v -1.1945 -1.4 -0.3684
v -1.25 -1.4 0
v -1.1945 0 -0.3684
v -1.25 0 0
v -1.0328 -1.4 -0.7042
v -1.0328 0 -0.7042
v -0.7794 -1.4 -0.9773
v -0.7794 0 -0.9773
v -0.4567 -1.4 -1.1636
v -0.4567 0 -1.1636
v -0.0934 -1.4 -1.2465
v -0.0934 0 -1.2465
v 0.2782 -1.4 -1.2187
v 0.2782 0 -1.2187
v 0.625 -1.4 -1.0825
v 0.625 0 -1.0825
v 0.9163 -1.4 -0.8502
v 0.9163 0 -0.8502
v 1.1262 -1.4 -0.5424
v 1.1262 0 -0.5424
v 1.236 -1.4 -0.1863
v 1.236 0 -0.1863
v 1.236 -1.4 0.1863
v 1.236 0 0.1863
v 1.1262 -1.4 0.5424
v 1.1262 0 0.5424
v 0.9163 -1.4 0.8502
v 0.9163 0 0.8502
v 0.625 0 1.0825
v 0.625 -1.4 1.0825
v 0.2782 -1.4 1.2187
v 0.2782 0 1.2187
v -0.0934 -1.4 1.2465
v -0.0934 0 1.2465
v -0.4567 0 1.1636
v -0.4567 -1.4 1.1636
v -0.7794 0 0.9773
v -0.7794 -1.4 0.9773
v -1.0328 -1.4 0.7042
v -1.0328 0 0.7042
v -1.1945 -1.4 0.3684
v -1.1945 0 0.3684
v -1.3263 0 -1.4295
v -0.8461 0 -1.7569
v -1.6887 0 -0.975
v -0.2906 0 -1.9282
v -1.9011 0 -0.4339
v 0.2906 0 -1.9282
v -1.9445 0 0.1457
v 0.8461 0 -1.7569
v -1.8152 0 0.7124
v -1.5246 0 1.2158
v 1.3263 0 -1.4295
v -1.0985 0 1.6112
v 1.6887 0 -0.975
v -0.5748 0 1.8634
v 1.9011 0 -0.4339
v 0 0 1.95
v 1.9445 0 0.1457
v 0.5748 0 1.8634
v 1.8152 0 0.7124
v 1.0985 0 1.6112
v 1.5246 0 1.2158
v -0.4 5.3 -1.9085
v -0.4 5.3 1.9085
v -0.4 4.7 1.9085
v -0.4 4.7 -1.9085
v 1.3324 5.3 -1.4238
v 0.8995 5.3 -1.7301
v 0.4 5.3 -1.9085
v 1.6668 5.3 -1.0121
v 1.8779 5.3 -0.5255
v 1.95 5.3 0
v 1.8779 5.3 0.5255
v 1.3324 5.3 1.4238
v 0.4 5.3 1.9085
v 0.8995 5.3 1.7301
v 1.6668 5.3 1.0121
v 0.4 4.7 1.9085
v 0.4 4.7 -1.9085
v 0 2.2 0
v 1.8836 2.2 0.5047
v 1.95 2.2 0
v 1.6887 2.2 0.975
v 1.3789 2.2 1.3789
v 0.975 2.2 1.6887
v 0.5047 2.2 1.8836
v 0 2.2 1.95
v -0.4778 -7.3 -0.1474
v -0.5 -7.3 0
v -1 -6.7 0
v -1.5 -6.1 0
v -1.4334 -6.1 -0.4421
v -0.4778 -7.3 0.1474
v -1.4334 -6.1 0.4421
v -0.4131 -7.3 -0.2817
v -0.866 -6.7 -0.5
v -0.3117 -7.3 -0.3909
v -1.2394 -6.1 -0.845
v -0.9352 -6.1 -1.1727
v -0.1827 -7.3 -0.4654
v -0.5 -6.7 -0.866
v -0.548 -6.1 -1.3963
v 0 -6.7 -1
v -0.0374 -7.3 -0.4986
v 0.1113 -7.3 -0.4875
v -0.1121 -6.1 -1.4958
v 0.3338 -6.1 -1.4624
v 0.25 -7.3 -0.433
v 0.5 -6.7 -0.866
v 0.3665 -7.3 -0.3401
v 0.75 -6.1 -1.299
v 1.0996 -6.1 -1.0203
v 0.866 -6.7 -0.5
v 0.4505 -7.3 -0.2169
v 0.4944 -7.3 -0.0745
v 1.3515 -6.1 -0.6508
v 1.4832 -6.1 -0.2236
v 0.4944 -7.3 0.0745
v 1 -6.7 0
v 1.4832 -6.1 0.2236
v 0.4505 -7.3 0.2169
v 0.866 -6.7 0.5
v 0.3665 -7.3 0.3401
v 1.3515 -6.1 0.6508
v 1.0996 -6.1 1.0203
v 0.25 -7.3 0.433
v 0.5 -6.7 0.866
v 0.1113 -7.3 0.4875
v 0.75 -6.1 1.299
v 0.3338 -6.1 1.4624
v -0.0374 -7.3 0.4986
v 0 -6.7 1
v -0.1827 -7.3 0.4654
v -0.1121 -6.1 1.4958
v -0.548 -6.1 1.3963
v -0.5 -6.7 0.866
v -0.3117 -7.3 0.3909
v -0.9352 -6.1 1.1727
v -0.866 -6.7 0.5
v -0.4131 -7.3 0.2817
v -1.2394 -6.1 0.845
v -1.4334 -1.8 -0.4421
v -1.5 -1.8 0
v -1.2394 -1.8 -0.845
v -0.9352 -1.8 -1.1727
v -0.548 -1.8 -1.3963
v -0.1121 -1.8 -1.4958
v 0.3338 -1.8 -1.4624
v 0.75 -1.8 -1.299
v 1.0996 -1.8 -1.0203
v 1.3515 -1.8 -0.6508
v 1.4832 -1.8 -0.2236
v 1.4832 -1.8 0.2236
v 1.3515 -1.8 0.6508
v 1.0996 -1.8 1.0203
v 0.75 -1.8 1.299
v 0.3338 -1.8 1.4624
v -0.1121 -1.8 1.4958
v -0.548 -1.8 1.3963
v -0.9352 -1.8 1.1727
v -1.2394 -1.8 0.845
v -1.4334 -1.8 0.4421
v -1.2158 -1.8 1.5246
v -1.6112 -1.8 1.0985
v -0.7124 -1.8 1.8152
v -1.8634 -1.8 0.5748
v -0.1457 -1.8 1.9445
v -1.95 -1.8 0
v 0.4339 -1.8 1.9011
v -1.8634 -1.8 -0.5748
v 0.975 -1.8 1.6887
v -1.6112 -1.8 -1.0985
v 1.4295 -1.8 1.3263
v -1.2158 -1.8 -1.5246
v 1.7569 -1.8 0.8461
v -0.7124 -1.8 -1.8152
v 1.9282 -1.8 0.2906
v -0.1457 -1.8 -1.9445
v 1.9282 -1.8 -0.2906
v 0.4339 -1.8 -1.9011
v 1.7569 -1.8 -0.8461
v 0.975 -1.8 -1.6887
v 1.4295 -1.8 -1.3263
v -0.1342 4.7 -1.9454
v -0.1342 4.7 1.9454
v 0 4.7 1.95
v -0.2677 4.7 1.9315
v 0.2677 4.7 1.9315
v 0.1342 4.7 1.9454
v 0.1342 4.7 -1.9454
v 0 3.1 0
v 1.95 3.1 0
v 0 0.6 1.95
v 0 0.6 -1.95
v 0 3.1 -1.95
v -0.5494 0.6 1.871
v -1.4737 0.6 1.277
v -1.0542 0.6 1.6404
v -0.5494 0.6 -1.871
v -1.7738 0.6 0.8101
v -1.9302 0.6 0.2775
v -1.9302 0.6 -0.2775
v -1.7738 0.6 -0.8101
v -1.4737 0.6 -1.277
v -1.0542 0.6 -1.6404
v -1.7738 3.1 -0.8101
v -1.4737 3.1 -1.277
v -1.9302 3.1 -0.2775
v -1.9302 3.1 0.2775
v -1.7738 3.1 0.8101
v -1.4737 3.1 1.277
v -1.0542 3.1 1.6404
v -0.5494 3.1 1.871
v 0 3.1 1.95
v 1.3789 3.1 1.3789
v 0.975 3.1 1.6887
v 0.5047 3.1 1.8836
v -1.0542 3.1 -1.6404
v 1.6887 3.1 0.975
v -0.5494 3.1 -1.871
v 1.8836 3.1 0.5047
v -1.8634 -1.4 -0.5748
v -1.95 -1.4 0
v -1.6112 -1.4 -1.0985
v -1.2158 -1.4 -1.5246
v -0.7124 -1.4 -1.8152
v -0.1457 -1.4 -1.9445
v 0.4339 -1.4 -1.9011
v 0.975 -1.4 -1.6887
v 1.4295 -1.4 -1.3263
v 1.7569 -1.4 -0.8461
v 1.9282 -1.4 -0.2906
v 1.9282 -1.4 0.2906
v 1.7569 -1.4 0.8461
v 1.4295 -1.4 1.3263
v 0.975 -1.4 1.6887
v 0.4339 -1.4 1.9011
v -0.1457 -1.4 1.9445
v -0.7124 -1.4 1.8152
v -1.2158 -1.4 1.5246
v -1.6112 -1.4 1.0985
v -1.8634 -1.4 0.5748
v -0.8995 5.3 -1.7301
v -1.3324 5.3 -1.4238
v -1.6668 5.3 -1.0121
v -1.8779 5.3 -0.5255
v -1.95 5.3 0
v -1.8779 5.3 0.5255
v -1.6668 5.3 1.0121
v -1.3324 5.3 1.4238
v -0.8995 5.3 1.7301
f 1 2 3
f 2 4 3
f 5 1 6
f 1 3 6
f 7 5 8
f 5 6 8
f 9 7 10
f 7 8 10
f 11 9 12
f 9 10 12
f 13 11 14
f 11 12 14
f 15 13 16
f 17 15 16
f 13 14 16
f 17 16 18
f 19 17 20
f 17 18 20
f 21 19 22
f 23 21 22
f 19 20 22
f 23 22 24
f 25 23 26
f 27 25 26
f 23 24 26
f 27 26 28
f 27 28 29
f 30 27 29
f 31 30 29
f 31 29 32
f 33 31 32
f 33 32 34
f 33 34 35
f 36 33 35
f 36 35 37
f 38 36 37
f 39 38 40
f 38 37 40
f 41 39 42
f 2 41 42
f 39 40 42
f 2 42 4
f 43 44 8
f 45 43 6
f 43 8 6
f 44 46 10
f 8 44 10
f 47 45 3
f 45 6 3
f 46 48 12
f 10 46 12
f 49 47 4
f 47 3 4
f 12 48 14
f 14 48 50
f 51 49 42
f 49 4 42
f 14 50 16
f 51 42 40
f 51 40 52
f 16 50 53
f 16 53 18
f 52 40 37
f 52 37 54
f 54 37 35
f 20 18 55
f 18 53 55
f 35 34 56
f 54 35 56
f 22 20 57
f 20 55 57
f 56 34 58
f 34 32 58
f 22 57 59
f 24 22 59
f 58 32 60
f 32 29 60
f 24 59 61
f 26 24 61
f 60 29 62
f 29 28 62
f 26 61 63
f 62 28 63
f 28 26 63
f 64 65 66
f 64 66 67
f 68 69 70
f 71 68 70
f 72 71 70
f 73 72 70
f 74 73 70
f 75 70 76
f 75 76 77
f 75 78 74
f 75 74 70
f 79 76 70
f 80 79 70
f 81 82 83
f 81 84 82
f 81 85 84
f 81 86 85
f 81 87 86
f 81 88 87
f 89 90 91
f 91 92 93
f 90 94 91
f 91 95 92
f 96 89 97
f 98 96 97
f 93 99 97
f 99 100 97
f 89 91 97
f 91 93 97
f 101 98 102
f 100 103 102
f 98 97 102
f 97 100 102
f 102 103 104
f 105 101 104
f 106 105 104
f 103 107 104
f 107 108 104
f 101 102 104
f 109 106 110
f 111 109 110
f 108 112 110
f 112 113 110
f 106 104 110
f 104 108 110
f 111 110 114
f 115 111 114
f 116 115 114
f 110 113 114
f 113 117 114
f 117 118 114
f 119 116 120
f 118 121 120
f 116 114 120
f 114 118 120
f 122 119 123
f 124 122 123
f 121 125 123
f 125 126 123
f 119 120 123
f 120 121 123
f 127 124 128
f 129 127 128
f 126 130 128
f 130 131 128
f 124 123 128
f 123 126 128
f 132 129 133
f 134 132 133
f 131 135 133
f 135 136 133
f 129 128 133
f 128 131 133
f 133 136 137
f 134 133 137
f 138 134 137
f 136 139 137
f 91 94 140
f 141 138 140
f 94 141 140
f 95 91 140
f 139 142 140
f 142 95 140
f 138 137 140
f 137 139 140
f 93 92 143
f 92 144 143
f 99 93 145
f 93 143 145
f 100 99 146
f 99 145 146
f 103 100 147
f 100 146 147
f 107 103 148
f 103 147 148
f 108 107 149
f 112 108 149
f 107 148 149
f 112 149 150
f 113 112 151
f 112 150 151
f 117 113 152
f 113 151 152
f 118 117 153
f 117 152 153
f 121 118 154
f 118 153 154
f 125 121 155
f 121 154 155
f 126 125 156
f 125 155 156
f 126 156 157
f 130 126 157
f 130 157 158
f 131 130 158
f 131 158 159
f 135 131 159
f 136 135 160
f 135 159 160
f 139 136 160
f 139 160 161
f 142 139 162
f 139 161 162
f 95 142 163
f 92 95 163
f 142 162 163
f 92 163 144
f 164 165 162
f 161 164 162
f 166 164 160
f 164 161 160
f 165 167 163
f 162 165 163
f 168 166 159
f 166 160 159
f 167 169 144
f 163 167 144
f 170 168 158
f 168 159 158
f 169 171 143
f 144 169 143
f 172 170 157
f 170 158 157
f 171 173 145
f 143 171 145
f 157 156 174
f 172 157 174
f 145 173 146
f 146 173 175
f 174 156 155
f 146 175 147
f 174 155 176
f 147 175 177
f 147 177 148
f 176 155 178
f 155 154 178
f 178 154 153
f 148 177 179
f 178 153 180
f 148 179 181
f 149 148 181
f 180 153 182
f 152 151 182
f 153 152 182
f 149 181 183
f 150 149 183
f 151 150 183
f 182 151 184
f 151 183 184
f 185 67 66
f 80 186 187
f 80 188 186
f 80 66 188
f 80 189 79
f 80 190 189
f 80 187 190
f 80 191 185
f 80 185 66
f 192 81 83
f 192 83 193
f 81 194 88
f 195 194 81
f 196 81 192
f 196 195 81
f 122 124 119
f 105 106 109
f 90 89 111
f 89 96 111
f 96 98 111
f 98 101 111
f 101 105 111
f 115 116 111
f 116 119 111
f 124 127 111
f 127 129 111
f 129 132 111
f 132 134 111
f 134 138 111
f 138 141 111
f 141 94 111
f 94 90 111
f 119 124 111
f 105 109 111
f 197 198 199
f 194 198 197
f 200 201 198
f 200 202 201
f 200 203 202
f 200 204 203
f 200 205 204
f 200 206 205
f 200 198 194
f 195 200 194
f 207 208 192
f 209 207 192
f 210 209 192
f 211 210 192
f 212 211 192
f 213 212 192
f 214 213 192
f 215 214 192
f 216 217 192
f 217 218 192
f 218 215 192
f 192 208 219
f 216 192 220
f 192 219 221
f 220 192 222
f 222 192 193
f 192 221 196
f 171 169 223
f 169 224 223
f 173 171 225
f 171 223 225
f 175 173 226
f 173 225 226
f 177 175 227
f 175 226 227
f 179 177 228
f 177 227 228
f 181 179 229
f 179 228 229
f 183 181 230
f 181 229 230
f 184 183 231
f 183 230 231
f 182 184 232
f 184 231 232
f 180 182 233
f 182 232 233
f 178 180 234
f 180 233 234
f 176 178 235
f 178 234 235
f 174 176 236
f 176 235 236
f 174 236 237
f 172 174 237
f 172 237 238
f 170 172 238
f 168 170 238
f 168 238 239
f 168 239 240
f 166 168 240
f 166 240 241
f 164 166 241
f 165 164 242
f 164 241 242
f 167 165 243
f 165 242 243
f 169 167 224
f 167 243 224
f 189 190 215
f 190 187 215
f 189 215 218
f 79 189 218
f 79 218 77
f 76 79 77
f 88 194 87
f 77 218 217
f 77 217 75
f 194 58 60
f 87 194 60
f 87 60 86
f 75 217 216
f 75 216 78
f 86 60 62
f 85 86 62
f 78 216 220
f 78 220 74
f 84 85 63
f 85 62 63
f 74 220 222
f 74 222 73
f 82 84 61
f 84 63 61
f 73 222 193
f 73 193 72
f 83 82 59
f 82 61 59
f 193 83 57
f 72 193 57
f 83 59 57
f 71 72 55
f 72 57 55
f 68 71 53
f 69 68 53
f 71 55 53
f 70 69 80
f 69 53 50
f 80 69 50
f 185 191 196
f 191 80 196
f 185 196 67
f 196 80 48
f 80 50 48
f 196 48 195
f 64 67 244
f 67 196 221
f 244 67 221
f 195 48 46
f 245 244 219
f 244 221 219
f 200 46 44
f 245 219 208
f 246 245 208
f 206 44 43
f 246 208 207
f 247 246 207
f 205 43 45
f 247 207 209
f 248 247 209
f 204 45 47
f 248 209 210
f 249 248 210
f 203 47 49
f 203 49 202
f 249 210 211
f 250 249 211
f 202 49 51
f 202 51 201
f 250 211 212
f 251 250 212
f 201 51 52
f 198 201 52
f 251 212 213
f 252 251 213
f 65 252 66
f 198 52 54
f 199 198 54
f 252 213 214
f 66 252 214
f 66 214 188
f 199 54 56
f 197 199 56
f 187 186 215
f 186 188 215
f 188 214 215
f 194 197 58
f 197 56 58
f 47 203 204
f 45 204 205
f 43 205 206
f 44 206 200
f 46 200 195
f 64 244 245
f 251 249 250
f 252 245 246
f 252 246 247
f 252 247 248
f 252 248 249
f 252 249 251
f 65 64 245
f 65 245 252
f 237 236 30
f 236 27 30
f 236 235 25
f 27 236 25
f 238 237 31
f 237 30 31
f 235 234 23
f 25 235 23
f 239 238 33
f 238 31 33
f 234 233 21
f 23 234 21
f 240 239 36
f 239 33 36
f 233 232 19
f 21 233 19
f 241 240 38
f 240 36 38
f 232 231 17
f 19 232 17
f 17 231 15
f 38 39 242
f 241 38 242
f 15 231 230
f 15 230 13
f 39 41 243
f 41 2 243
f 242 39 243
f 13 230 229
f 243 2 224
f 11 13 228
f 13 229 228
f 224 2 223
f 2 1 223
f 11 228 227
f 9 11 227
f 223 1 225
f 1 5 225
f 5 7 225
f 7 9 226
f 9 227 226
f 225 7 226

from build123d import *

# Parameters (mm, degrees)
BASES_R              = 1.95
BASE_DEPTH           = 5.3
SCREWSLOTS_W         = 0.8
SCREWSLOTS_H         = 3.9
SCREWSLOT_DEPTH      = 0.6
MAINSLOT_DEPTH       = 6.97452927
MAINSLOT_DEPTH_BACK  = 6.97452927
MAINSLOTS_W          = 1.95
MAINSLOTS_H          = 2.5
SMALLSLOT_DEPTH      = 6.97452927
SMALLSLOT_DEPTH_BACK = 6.97452927
SMALLSLOTS_W         = 1.95
SMALLSLOTS_H         = 0.9


with BuildPart() as part:
    # BaseS → Base (new body)
    with BuildSketch(Plane(origin=(0, 0, 0), x_dir=(1, 0, 0), z_dir=(0, 1, 0))):
        Circle(BASES_R)
    extrude(amount=BASE_DEPTH)

    # ScrewSlotS → ScrewSlot (cut)
    with BuildSketch(Plane(origin=(0, 5.3, 0), x_dir=(1, 0, 0), z_dir=(0, 1, 0))):
        Rectangle(SCREWSLOTS_W, SCREWSLOTS_H)
    extrude(amount=-SCREWSLOT_DEPTH, mode=Mode.SUBTRACT)

    # MainSlotS → MainSlot (cut, two sides: drawn at the far end of the back side and taken through both)
    with BuildSketch(Plane.XY.offset(-MAINSLOT_DEPTH_BACK)):
        with Locations((-0.975, 1.85)):
            Rectangle(MAINSLOTS_W, MAINSLOTS_H)
    extrude(amount=MAINSLOT_DEPTH + MAINSLOT_DEPTH_BACK, mode=Mode.SUBTRACT)

    # SmallSlotS → SmallSlot (cut, two sides: drawn at the far end of the back side and taken through both)
    with BuildSketch(Plane(origin=(0, 0, 0), x_dir=(0, 0, -1), z_dir=(1, 0, 0)).offset(-SMALLSLOT_DEPTH_BACK)):
        with Locations((-0.975, 2.65)):
            Rectangle(SMALLSLOTS_W, SMALLSLOTS_H)
    extrude(amount=SMALLSLOT_DEPTH + SMALLSLOT_DEPTH_BACK, mode=Mode.SUBTRACT)

    # O-RingBodyS → O-RingBody (revolve)
    with BuildSketch(Plane.XY):
        Polygon((-1.25, 0), (0, 0), (0, -7.3), (-0.5, -7.3), (-1.5, -6.1), (-1.5, -1.8), (-1.95, -1.8), (-1.95, -1.4), (-1.25, -1.4), align=None)
    revolve(axis=Axis((0, 0, 0), (0, -1, 0)))


solid = part.part
